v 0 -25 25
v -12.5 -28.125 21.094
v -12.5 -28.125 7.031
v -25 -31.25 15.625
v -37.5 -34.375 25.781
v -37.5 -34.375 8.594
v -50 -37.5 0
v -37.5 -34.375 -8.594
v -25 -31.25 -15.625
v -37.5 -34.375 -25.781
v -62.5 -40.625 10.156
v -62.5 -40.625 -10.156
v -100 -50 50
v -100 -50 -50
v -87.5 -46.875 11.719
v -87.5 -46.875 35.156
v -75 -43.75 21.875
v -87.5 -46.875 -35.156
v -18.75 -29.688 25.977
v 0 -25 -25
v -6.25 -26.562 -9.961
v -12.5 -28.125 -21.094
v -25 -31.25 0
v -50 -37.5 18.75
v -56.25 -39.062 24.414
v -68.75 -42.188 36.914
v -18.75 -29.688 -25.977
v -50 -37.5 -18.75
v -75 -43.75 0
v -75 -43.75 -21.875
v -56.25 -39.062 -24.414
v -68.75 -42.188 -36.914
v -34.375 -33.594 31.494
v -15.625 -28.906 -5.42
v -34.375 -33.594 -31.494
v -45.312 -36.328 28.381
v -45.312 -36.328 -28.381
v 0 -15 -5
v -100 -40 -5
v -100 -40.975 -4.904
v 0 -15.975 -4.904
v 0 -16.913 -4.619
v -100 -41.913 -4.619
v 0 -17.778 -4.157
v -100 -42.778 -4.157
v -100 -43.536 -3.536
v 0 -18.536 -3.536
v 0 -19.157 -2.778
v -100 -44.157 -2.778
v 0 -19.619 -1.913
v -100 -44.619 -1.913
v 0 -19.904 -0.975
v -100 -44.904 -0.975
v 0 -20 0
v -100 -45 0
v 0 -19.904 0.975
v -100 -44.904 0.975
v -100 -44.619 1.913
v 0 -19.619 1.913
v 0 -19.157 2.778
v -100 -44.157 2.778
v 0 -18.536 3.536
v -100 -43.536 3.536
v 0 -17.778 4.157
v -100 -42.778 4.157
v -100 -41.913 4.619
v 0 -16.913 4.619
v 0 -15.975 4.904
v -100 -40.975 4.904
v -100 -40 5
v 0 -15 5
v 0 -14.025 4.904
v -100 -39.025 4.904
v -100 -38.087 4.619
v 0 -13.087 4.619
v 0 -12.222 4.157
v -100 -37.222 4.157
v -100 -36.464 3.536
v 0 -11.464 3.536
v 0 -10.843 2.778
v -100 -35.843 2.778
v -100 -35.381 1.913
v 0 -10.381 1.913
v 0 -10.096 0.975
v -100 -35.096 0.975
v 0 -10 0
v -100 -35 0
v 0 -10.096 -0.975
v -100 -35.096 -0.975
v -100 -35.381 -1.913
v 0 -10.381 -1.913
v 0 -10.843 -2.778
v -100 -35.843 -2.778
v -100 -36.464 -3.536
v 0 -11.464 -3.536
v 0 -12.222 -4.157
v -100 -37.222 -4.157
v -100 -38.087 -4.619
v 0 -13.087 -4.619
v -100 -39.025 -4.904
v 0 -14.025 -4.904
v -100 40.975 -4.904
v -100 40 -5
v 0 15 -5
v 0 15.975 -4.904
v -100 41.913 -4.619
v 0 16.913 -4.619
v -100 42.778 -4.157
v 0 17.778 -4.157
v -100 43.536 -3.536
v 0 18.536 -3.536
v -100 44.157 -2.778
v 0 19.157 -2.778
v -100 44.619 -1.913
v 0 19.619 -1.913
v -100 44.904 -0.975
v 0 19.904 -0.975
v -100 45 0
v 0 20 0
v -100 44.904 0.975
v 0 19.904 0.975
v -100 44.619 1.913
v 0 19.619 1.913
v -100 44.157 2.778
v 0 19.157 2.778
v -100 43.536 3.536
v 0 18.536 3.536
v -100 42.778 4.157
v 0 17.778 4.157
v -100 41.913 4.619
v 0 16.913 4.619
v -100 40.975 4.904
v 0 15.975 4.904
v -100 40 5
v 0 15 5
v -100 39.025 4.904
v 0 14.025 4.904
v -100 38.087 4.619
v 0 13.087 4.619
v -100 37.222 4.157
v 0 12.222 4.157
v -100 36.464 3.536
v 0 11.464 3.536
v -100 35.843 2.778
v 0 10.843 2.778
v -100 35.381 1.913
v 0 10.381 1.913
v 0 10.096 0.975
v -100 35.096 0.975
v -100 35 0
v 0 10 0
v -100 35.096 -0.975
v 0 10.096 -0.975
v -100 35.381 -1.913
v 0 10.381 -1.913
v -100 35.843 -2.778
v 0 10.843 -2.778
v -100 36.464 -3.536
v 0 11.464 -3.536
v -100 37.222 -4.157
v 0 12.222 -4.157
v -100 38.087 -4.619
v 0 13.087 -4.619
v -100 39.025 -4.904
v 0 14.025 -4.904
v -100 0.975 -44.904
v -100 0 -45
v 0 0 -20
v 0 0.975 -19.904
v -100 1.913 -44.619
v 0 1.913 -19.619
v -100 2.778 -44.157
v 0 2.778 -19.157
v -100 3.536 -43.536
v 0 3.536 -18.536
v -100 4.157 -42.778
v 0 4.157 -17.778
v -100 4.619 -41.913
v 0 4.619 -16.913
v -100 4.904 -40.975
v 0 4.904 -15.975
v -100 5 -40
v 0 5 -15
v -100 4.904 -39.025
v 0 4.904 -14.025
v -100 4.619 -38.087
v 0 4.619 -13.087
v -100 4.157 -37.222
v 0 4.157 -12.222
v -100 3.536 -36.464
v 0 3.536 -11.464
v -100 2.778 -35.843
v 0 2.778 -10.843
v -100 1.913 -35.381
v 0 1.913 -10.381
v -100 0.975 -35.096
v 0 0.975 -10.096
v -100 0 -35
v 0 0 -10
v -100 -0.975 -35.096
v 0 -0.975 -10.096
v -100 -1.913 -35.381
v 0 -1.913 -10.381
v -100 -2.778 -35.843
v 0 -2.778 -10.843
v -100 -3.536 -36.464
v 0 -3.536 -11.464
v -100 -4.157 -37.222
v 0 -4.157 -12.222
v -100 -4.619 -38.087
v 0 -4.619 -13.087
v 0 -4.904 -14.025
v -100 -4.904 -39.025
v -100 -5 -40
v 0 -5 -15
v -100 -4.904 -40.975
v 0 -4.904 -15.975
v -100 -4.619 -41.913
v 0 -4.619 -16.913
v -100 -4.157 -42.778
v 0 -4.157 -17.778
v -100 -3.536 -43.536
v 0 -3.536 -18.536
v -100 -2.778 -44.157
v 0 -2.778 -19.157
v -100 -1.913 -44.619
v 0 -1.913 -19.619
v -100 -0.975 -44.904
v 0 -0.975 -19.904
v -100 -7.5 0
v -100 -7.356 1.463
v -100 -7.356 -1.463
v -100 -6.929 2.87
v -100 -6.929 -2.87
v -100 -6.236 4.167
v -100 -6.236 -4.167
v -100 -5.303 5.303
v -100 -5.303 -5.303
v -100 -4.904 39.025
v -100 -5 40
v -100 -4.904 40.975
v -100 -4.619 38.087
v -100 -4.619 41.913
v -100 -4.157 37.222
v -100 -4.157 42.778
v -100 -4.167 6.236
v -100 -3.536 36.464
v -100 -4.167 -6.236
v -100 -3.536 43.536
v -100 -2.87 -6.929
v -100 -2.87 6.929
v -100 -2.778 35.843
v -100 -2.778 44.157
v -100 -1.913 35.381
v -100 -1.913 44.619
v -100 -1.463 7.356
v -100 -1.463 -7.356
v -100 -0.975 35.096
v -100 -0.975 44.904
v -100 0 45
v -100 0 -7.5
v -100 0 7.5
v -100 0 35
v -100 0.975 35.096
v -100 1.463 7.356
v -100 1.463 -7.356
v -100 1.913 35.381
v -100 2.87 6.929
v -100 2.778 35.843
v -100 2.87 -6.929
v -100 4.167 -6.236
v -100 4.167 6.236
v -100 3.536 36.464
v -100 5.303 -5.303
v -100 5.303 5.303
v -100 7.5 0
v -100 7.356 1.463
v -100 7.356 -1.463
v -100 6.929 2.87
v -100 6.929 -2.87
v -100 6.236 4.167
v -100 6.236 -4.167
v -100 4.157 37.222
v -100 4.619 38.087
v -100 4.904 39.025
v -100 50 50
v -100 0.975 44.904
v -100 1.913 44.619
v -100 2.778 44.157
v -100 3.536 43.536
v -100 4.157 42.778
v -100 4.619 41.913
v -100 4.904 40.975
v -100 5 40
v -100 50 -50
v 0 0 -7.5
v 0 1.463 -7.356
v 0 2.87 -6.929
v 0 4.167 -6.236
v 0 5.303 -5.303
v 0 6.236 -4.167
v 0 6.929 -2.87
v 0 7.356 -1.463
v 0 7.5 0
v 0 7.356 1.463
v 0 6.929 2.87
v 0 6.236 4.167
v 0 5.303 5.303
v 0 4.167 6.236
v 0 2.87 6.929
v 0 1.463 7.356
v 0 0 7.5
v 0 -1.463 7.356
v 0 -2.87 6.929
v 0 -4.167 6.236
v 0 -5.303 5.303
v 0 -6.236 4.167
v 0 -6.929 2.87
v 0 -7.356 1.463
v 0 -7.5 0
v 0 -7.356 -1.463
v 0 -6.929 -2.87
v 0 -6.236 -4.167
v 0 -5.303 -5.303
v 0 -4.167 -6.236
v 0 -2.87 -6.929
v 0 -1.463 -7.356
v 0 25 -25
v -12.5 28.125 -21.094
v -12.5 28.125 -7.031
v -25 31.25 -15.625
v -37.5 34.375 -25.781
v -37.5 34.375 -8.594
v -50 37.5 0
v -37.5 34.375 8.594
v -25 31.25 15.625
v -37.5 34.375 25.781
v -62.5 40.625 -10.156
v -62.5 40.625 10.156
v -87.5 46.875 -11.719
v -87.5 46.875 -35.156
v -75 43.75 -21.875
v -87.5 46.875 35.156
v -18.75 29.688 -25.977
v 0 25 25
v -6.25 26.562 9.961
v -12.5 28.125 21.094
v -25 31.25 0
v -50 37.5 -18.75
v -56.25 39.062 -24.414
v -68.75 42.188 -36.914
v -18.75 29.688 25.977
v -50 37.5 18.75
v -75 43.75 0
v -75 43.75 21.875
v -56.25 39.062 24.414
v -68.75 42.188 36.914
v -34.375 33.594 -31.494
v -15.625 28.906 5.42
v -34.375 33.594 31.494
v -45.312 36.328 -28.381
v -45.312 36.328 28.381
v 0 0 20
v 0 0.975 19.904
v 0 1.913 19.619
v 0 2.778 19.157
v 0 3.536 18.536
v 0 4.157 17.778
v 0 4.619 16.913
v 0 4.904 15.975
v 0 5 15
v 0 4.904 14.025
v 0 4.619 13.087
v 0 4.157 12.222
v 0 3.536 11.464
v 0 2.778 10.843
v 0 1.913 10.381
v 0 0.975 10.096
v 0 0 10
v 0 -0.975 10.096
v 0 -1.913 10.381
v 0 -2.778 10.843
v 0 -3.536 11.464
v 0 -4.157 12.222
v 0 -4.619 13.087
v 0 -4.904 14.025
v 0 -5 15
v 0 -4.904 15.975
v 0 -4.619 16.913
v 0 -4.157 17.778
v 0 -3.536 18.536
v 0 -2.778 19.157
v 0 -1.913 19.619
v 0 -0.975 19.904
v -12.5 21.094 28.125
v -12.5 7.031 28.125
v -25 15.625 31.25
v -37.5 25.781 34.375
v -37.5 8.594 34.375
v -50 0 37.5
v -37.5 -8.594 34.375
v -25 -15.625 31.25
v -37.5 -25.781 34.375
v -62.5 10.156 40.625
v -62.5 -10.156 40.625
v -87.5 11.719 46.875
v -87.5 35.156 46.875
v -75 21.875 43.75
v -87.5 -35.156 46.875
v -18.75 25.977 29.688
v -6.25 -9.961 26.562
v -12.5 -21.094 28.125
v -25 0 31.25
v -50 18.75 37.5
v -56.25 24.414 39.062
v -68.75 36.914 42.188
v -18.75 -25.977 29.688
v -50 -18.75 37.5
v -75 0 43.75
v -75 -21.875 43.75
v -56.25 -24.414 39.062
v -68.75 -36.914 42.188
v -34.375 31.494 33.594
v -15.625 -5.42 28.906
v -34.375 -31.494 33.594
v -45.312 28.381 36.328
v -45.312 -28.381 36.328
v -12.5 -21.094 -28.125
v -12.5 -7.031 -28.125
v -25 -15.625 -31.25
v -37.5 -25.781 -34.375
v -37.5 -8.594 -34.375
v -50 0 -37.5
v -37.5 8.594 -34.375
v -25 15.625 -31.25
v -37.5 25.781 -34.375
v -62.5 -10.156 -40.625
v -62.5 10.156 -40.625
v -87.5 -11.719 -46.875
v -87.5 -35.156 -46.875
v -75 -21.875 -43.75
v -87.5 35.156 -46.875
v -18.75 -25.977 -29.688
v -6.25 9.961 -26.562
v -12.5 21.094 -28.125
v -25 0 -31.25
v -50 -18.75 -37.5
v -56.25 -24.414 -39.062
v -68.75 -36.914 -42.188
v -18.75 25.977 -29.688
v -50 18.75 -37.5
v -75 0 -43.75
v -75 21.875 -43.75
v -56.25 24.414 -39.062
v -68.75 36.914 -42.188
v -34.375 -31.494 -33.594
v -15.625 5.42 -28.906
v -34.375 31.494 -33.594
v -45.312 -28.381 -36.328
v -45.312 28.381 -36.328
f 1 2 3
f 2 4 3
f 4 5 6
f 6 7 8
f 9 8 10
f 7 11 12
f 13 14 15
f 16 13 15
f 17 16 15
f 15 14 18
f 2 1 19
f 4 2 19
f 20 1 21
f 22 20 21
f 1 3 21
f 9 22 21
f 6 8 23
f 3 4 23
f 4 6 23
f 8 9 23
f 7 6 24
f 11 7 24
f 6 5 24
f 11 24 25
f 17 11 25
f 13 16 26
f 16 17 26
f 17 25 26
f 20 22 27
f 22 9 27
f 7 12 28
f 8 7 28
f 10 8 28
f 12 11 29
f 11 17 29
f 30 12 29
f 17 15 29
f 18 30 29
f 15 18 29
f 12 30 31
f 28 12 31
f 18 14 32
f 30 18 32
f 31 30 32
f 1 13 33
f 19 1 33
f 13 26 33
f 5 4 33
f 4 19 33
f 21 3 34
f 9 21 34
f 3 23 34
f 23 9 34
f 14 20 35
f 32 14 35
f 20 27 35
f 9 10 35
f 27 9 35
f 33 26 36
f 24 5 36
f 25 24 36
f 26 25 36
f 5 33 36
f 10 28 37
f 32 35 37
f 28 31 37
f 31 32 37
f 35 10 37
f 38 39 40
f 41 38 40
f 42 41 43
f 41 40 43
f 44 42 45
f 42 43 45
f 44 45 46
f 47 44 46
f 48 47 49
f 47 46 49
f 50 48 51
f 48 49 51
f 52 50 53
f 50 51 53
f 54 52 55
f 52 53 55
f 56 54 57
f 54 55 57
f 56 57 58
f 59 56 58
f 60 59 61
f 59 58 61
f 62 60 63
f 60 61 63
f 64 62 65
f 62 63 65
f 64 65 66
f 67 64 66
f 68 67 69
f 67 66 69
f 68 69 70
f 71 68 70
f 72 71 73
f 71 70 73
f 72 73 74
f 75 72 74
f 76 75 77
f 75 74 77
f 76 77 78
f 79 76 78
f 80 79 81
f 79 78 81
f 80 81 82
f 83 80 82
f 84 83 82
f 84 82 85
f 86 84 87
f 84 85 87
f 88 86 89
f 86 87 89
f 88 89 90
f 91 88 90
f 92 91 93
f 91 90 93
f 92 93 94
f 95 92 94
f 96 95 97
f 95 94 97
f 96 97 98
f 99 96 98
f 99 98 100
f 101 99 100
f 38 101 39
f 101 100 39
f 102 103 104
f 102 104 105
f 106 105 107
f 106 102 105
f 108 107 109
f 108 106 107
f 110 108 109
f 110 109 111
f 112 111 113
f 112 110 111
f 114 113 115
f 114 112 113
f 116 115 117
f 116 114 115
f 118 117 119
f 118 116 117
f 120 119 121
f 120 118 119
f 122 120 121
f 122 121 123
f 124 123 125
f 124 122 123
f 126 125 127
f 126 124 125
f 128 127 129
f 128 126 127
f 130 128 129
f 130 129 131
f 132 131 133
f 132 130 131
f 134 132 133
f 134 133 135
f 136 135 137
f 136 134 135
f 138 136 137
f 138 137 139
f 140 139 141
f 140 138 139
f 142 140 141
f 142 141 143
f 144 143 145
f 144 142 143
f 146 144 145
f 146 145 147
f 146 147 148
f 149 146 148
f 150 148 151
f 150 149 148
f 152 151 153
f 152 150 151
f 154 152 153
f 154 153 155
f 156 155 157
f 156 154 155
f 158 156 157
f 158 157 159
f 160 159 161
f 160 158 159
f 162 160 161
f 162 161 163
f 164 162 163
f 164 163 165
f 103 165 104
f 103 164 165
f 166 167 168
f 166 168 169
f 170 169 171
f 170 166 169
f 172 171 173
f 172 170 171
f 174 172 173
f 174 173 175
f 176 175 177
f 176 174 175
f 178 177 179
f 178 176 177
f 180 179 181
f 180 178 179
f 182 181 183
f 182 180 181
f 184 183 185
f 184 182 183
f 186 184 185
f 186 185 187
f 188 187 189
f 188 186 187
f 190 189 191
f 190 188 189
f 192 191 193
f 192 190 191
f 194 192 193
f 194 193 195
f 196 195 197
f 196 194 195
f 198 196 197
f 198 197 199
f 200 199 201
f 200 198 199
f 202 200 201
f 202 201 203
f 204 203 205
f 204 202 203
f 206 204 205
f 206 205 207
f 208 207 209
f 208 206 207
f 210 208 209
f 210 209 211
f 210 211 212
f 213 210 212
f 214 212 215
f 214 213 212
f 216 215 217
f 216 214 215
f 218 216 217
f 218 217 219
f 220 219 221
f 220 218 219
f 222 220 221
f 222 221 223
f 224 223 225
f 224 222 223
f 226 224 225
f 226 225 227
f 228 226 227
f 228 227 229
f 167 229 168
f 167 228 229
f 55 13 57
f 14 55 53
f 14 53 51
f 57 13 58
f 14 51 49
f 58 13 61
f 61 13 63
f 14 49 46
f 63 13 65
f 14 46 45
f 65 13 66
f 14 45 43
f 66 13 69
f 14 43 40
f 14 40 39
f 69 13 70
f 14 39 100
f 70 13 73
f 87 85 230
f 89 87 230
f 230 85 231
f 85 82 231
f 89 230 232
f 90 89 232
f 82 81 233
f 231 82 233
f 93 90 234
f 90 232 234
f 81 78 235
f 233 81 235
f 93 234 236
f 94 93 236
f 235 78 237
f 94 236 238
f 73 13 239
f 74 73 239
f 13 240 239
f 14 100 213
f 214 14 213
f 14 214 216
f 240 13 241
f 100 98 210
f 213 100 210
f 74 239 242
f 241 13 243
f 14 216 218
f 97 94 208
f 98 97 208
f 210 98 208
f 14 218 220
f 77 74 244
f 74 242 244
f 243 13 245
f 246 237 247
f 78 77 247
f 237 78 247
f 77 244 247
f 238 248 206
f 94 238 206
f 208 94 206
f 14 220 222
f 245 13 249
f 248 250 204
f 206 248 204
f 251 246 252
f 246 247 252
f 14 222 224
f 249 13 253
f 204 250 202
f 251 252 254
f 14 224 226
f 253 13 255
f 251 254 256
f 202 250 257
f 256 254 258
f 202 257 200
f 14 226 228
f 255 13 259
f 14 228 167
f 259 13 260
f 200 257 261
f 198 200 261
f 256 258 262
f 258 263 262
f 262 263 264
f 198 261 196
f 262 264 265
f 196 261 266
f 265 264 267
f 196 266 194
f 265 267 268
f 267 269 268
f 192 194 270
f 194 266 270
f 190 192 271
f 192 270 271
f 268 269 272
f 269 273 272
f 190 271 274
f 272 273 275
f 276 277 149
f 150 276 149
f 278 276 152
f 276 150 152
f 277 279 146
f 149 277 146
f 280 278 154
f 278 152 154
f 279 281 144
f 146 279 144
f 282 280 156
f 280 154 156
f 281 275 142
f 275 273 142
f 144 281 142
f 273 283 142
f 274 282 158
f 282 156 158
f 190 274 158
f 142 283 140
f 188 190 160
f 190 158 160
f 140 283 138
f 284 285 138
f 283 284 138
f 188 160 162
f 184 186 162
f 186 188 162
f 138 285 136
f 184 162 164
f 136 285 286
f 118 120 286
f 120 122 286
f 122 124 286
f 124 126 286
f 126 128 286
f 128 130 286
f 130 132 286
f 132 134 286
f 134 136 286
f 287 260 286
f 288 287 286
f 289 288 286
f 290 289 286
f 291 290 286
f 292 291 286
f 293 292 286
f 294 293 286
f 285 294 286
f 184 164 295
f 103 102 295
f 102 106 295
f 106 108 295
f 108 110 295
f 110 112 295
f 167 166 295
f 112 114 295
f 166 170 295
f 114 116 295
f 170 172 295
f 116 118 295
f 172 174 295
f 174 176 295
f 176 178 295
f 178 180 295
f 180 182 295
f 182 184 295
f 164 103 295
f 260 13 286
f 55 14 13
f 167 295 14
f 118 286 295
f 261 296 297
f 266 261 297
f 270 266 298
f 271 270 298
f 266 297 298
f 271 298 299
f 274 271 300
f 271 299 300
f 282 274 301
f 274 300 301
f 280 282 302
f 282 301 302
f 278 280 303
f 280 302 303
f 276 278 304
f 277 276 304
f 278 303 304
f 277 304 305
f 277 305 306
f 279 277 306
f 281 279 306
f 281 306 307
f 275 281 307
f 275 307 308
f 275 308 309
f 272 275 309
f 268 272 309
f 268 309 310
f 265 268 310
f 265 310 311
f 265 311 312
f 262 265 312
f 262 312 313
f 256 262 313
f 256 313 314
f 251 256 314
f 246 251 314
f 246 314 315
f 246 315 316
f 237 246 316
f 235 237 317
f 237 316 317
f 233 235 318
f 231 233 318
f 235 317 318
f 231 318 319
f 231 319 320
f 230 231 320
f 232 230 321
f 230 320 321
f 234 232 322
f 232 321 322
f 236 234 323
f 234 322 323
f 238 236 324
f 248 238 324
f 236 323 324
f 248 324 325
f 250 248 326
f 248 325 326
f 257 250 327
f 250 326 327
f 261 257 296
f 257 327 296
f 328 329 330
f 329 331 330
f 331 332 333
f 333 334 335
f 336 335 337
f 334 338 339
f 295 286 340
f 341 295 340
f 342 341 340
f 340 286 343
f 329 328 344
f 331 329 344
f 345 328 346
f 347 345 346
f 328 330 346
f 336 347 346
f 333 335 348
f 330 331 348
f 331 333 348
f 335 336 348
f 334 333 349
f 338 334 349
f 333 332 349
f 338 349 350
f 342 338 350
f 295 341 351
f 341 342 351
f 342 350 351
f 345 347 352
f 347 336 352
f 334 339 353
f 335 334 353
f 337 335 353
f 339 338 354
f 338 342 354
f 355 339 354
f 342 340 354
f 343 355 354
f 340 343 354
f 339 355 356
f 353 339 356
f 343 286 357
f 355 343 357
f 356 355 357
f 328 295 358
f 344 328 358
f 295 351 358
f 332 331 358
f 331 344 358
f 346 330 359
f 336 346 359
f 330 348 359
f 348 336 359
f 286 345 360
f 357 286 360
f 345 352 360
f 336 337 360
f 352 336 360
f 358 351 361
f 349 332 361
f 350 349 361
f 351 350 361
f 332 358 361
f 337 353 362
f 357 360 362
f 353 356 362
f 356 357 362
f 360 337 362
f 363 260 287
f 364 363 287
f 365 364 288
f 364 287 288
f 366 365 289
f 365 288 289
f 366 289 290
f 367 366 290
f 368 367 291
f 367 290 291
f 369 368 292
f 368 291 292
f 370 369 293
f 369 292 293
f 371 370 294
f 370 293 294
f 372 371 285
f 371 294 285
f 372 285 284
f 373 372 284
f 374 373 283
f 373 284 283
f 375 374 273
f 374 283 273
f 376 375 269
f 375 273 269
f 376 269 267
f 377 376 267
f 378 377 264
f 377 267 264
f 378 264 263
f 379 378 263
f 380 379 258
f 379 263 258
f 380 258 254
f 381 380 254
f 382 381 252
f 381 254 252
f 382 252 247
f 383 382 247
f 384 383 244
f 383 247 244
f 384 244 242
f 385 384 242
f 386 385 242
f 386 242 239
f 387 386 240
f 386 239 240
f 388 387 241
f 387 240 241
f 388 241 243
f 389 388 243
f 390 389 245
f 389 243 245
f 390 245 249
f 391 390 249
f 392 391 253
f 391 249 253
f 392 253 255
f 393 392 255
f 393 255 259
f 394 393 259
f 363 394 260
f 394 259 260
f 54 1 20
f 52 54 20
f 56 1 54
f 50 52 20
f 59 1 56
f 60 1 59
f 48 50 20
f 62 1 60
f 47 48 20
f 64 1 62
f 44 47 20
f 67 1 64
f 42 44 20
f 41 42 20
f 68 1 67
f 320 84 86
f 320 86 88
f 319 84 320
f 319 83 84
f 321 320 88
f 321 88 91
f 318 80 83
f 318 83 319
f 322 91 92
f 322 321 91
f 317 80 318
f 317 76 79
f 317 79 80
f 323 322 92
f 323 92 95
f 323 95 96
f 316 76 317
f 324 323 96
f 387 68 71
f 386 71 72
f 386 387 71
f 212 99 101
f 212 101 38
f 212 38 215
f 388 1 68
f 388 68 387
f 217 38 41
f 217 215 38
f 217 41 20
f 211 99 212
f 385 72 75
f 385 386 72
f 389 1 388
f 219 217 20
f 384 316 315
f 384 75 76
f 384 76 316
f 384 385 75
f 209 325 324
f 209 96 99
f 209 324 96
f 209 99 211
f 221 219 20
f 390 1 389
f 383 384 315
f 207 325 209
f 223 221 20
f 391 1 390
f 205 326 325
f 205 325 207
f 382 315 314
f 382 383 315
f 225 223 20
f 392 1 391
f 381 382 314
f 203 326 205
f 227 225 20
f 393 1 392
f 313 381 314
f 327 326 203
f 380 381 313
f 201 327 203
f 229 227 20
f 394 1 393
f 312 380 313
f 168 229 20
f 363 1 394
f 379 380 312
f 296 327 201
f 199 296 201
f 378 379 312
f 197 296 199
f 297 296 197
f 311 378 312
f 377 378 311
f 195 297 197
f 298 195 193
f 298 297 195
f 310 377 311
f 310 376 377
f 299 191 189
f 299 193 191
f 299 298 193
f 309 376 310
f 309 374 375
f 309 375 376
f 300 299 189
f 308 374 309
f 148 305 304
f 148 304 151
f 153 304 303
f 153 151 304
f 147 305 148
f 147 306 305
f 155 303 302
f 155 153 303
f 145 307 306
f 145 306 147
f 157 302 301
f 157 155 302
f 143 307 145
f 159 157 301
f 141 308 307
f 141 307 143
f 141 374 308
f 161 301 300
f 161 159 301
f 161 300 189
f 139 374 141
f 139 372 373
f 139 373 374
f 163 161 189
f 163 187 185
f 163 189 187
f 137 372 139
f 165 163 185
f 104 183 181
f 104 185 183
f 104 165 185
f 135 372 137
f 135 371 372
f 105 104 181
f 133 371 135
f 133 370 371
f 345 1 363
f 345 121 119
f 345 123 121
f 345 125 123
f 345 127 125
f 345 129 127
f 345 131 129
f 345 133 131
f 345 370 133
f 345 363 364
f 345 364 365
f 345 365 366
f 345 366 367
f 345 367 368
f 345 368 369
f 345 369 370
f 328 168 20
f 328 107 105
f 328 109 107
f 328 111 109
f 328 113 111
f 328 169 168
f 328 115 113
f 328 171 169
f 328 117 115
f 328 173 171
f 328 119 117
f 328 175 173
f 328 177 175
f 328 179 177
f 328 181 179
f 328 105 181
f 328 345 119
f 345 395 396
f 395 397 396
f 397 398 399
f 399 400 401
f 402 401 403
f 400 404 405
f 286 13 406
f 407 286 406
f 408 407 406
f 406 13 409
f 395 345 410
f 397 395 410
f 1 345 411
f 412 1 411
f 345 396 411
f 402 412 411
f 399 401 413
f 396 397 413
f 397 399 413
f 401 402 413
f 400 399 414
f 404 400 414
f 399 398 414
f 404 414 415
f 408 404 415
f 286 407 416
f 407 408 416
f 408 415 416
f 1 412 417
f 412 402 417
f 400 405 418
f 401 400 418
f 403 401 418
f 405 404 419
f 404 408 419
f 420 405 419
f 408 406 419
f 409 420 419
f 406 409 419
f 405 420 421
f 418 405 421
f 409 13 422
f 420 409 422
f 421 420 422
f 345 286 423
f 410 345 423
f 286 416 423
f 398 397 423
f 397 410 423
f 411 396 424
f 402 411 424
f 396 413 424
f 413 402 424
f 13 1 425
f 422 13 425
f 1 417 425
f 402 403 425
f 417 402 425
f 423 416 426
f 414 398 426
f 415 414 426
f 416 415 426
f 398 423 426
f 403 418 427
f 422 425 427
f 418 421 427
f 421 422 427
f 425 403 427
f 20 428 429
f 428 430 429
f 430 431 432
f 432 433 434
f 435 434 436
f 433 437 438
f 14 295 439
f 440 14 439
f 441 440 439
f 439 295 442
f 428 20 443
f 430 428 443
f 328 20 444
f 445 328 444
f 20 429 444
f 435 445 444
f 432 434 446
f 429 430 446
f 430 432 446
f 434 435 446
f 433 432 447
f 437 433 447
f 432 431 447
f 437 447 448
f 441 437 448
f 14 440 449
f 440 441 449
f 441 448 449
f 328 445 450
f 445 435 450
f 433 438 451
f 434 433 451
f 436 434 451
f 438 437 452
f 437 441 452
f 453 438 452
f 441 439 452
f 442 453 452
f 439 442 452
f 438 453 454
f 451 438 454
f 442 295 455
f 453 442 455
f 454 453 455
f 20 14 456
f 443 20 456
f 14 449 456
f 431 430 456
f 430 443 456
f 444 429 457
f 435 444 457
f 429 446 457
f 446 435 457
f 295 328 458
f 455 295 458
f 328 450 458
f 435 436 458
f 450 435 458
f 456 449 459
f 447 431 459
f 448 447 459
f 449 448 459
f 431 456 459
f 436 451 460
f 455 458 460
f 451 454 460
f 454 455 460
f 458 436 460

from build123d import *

# Parameters (mm, degrees)
SKETCH1_W          = 50
SKETCH1_H          = 50
SKETCH2_W          = 100
SKETCH2_H          = 100
SKETCH3_R          = 5
SKETCH6_R          = 5
SKETCH7_R          = 7.5
CUT_EXTRUDE1_DEPTH = 101.0000001


with BuildPart() as part:
    # Sketch1 → Loft1 section 0
    with BuildSketch(Plane(origin=(0, 0, 0), x_dir=(0, 0, -1), z_dir=(1, 0, 0))):
        Rectangle(SKETCH1_W, SKETCH1_H)
    # Sketch2 → Loft1 section 1
    with BuildSketch(Plane(origin=(-100, 0, 0), x_dir=(0, 0, -1), z_dir=(1, 0, 0))):
        Rectangle(SKETCH2_W, SKETCH2_H)
    loft()

    # Cut-Sweep2: sweep along a path in Sketch4
    with BuildLine(Plane(origin=(0, 0, 0), x_dir=(1, 0, 0), z_dir=(0, 1, 0))) as cut_sweep2_path:
        Line((0, 15), (-100, 40))
    # Sketch3 → Cut-Sweep2 (sweep, cut)
    with BuildSketch(Plane(origin=(0, 0, 0), x_dir=(0, 0, -1), z_dir=(1, 0, 0))):
        with Locations((15, 0)):
            Circle(SKETCH3_R)
    cut_sweep2 = sweep(path=cut_sweep2_path.line, mode=Mode.SUBTRACT)

    # Cut-Sweep3: sweep along a path in Sketch5
    with BuildLine(Plane.XY) as cut_sweep3_path:
        Line((0, 15), (-100, 40))
    # Sketch6 → Cut-Sweep3 (sweep, cut)
    with BuildSketch(Plane(origin=(0, 0, 0), x_dir=(0, 0, -1), z_dir=(1, 0, 0))):
        with Locations((0, 15)):
            Circle(SKETCH6_R)
    cut_sweep3 = sweep(path=cut_sweep3_path.line, mode=Mode.SUBTRACT)

    # Mirror1: Cut-Sweep2 across plane
    add(cut_sweep2.mirror(Plane.XY), mode=Mode.SUBTRACT)

    # Mirror2: Cut-Sweep3 across plane
    add(cut_sweep3.mirror(Plane.ZX), mode=Mode.SUBTRACT)

    # Sketch7 → Cut-Extrude1 (cut, through all)
    with BuildSketch(Plane(origin=(0, 0, 0), x_dir=(0, 0, -1), z_dir=(1, 0, 0))):
        Circle(SKETCH7_R)
    extrude(amount=-CUT_EXTRUDE1_DEPTH, mode=Mode.SUBTRACT)


solid = part.part
